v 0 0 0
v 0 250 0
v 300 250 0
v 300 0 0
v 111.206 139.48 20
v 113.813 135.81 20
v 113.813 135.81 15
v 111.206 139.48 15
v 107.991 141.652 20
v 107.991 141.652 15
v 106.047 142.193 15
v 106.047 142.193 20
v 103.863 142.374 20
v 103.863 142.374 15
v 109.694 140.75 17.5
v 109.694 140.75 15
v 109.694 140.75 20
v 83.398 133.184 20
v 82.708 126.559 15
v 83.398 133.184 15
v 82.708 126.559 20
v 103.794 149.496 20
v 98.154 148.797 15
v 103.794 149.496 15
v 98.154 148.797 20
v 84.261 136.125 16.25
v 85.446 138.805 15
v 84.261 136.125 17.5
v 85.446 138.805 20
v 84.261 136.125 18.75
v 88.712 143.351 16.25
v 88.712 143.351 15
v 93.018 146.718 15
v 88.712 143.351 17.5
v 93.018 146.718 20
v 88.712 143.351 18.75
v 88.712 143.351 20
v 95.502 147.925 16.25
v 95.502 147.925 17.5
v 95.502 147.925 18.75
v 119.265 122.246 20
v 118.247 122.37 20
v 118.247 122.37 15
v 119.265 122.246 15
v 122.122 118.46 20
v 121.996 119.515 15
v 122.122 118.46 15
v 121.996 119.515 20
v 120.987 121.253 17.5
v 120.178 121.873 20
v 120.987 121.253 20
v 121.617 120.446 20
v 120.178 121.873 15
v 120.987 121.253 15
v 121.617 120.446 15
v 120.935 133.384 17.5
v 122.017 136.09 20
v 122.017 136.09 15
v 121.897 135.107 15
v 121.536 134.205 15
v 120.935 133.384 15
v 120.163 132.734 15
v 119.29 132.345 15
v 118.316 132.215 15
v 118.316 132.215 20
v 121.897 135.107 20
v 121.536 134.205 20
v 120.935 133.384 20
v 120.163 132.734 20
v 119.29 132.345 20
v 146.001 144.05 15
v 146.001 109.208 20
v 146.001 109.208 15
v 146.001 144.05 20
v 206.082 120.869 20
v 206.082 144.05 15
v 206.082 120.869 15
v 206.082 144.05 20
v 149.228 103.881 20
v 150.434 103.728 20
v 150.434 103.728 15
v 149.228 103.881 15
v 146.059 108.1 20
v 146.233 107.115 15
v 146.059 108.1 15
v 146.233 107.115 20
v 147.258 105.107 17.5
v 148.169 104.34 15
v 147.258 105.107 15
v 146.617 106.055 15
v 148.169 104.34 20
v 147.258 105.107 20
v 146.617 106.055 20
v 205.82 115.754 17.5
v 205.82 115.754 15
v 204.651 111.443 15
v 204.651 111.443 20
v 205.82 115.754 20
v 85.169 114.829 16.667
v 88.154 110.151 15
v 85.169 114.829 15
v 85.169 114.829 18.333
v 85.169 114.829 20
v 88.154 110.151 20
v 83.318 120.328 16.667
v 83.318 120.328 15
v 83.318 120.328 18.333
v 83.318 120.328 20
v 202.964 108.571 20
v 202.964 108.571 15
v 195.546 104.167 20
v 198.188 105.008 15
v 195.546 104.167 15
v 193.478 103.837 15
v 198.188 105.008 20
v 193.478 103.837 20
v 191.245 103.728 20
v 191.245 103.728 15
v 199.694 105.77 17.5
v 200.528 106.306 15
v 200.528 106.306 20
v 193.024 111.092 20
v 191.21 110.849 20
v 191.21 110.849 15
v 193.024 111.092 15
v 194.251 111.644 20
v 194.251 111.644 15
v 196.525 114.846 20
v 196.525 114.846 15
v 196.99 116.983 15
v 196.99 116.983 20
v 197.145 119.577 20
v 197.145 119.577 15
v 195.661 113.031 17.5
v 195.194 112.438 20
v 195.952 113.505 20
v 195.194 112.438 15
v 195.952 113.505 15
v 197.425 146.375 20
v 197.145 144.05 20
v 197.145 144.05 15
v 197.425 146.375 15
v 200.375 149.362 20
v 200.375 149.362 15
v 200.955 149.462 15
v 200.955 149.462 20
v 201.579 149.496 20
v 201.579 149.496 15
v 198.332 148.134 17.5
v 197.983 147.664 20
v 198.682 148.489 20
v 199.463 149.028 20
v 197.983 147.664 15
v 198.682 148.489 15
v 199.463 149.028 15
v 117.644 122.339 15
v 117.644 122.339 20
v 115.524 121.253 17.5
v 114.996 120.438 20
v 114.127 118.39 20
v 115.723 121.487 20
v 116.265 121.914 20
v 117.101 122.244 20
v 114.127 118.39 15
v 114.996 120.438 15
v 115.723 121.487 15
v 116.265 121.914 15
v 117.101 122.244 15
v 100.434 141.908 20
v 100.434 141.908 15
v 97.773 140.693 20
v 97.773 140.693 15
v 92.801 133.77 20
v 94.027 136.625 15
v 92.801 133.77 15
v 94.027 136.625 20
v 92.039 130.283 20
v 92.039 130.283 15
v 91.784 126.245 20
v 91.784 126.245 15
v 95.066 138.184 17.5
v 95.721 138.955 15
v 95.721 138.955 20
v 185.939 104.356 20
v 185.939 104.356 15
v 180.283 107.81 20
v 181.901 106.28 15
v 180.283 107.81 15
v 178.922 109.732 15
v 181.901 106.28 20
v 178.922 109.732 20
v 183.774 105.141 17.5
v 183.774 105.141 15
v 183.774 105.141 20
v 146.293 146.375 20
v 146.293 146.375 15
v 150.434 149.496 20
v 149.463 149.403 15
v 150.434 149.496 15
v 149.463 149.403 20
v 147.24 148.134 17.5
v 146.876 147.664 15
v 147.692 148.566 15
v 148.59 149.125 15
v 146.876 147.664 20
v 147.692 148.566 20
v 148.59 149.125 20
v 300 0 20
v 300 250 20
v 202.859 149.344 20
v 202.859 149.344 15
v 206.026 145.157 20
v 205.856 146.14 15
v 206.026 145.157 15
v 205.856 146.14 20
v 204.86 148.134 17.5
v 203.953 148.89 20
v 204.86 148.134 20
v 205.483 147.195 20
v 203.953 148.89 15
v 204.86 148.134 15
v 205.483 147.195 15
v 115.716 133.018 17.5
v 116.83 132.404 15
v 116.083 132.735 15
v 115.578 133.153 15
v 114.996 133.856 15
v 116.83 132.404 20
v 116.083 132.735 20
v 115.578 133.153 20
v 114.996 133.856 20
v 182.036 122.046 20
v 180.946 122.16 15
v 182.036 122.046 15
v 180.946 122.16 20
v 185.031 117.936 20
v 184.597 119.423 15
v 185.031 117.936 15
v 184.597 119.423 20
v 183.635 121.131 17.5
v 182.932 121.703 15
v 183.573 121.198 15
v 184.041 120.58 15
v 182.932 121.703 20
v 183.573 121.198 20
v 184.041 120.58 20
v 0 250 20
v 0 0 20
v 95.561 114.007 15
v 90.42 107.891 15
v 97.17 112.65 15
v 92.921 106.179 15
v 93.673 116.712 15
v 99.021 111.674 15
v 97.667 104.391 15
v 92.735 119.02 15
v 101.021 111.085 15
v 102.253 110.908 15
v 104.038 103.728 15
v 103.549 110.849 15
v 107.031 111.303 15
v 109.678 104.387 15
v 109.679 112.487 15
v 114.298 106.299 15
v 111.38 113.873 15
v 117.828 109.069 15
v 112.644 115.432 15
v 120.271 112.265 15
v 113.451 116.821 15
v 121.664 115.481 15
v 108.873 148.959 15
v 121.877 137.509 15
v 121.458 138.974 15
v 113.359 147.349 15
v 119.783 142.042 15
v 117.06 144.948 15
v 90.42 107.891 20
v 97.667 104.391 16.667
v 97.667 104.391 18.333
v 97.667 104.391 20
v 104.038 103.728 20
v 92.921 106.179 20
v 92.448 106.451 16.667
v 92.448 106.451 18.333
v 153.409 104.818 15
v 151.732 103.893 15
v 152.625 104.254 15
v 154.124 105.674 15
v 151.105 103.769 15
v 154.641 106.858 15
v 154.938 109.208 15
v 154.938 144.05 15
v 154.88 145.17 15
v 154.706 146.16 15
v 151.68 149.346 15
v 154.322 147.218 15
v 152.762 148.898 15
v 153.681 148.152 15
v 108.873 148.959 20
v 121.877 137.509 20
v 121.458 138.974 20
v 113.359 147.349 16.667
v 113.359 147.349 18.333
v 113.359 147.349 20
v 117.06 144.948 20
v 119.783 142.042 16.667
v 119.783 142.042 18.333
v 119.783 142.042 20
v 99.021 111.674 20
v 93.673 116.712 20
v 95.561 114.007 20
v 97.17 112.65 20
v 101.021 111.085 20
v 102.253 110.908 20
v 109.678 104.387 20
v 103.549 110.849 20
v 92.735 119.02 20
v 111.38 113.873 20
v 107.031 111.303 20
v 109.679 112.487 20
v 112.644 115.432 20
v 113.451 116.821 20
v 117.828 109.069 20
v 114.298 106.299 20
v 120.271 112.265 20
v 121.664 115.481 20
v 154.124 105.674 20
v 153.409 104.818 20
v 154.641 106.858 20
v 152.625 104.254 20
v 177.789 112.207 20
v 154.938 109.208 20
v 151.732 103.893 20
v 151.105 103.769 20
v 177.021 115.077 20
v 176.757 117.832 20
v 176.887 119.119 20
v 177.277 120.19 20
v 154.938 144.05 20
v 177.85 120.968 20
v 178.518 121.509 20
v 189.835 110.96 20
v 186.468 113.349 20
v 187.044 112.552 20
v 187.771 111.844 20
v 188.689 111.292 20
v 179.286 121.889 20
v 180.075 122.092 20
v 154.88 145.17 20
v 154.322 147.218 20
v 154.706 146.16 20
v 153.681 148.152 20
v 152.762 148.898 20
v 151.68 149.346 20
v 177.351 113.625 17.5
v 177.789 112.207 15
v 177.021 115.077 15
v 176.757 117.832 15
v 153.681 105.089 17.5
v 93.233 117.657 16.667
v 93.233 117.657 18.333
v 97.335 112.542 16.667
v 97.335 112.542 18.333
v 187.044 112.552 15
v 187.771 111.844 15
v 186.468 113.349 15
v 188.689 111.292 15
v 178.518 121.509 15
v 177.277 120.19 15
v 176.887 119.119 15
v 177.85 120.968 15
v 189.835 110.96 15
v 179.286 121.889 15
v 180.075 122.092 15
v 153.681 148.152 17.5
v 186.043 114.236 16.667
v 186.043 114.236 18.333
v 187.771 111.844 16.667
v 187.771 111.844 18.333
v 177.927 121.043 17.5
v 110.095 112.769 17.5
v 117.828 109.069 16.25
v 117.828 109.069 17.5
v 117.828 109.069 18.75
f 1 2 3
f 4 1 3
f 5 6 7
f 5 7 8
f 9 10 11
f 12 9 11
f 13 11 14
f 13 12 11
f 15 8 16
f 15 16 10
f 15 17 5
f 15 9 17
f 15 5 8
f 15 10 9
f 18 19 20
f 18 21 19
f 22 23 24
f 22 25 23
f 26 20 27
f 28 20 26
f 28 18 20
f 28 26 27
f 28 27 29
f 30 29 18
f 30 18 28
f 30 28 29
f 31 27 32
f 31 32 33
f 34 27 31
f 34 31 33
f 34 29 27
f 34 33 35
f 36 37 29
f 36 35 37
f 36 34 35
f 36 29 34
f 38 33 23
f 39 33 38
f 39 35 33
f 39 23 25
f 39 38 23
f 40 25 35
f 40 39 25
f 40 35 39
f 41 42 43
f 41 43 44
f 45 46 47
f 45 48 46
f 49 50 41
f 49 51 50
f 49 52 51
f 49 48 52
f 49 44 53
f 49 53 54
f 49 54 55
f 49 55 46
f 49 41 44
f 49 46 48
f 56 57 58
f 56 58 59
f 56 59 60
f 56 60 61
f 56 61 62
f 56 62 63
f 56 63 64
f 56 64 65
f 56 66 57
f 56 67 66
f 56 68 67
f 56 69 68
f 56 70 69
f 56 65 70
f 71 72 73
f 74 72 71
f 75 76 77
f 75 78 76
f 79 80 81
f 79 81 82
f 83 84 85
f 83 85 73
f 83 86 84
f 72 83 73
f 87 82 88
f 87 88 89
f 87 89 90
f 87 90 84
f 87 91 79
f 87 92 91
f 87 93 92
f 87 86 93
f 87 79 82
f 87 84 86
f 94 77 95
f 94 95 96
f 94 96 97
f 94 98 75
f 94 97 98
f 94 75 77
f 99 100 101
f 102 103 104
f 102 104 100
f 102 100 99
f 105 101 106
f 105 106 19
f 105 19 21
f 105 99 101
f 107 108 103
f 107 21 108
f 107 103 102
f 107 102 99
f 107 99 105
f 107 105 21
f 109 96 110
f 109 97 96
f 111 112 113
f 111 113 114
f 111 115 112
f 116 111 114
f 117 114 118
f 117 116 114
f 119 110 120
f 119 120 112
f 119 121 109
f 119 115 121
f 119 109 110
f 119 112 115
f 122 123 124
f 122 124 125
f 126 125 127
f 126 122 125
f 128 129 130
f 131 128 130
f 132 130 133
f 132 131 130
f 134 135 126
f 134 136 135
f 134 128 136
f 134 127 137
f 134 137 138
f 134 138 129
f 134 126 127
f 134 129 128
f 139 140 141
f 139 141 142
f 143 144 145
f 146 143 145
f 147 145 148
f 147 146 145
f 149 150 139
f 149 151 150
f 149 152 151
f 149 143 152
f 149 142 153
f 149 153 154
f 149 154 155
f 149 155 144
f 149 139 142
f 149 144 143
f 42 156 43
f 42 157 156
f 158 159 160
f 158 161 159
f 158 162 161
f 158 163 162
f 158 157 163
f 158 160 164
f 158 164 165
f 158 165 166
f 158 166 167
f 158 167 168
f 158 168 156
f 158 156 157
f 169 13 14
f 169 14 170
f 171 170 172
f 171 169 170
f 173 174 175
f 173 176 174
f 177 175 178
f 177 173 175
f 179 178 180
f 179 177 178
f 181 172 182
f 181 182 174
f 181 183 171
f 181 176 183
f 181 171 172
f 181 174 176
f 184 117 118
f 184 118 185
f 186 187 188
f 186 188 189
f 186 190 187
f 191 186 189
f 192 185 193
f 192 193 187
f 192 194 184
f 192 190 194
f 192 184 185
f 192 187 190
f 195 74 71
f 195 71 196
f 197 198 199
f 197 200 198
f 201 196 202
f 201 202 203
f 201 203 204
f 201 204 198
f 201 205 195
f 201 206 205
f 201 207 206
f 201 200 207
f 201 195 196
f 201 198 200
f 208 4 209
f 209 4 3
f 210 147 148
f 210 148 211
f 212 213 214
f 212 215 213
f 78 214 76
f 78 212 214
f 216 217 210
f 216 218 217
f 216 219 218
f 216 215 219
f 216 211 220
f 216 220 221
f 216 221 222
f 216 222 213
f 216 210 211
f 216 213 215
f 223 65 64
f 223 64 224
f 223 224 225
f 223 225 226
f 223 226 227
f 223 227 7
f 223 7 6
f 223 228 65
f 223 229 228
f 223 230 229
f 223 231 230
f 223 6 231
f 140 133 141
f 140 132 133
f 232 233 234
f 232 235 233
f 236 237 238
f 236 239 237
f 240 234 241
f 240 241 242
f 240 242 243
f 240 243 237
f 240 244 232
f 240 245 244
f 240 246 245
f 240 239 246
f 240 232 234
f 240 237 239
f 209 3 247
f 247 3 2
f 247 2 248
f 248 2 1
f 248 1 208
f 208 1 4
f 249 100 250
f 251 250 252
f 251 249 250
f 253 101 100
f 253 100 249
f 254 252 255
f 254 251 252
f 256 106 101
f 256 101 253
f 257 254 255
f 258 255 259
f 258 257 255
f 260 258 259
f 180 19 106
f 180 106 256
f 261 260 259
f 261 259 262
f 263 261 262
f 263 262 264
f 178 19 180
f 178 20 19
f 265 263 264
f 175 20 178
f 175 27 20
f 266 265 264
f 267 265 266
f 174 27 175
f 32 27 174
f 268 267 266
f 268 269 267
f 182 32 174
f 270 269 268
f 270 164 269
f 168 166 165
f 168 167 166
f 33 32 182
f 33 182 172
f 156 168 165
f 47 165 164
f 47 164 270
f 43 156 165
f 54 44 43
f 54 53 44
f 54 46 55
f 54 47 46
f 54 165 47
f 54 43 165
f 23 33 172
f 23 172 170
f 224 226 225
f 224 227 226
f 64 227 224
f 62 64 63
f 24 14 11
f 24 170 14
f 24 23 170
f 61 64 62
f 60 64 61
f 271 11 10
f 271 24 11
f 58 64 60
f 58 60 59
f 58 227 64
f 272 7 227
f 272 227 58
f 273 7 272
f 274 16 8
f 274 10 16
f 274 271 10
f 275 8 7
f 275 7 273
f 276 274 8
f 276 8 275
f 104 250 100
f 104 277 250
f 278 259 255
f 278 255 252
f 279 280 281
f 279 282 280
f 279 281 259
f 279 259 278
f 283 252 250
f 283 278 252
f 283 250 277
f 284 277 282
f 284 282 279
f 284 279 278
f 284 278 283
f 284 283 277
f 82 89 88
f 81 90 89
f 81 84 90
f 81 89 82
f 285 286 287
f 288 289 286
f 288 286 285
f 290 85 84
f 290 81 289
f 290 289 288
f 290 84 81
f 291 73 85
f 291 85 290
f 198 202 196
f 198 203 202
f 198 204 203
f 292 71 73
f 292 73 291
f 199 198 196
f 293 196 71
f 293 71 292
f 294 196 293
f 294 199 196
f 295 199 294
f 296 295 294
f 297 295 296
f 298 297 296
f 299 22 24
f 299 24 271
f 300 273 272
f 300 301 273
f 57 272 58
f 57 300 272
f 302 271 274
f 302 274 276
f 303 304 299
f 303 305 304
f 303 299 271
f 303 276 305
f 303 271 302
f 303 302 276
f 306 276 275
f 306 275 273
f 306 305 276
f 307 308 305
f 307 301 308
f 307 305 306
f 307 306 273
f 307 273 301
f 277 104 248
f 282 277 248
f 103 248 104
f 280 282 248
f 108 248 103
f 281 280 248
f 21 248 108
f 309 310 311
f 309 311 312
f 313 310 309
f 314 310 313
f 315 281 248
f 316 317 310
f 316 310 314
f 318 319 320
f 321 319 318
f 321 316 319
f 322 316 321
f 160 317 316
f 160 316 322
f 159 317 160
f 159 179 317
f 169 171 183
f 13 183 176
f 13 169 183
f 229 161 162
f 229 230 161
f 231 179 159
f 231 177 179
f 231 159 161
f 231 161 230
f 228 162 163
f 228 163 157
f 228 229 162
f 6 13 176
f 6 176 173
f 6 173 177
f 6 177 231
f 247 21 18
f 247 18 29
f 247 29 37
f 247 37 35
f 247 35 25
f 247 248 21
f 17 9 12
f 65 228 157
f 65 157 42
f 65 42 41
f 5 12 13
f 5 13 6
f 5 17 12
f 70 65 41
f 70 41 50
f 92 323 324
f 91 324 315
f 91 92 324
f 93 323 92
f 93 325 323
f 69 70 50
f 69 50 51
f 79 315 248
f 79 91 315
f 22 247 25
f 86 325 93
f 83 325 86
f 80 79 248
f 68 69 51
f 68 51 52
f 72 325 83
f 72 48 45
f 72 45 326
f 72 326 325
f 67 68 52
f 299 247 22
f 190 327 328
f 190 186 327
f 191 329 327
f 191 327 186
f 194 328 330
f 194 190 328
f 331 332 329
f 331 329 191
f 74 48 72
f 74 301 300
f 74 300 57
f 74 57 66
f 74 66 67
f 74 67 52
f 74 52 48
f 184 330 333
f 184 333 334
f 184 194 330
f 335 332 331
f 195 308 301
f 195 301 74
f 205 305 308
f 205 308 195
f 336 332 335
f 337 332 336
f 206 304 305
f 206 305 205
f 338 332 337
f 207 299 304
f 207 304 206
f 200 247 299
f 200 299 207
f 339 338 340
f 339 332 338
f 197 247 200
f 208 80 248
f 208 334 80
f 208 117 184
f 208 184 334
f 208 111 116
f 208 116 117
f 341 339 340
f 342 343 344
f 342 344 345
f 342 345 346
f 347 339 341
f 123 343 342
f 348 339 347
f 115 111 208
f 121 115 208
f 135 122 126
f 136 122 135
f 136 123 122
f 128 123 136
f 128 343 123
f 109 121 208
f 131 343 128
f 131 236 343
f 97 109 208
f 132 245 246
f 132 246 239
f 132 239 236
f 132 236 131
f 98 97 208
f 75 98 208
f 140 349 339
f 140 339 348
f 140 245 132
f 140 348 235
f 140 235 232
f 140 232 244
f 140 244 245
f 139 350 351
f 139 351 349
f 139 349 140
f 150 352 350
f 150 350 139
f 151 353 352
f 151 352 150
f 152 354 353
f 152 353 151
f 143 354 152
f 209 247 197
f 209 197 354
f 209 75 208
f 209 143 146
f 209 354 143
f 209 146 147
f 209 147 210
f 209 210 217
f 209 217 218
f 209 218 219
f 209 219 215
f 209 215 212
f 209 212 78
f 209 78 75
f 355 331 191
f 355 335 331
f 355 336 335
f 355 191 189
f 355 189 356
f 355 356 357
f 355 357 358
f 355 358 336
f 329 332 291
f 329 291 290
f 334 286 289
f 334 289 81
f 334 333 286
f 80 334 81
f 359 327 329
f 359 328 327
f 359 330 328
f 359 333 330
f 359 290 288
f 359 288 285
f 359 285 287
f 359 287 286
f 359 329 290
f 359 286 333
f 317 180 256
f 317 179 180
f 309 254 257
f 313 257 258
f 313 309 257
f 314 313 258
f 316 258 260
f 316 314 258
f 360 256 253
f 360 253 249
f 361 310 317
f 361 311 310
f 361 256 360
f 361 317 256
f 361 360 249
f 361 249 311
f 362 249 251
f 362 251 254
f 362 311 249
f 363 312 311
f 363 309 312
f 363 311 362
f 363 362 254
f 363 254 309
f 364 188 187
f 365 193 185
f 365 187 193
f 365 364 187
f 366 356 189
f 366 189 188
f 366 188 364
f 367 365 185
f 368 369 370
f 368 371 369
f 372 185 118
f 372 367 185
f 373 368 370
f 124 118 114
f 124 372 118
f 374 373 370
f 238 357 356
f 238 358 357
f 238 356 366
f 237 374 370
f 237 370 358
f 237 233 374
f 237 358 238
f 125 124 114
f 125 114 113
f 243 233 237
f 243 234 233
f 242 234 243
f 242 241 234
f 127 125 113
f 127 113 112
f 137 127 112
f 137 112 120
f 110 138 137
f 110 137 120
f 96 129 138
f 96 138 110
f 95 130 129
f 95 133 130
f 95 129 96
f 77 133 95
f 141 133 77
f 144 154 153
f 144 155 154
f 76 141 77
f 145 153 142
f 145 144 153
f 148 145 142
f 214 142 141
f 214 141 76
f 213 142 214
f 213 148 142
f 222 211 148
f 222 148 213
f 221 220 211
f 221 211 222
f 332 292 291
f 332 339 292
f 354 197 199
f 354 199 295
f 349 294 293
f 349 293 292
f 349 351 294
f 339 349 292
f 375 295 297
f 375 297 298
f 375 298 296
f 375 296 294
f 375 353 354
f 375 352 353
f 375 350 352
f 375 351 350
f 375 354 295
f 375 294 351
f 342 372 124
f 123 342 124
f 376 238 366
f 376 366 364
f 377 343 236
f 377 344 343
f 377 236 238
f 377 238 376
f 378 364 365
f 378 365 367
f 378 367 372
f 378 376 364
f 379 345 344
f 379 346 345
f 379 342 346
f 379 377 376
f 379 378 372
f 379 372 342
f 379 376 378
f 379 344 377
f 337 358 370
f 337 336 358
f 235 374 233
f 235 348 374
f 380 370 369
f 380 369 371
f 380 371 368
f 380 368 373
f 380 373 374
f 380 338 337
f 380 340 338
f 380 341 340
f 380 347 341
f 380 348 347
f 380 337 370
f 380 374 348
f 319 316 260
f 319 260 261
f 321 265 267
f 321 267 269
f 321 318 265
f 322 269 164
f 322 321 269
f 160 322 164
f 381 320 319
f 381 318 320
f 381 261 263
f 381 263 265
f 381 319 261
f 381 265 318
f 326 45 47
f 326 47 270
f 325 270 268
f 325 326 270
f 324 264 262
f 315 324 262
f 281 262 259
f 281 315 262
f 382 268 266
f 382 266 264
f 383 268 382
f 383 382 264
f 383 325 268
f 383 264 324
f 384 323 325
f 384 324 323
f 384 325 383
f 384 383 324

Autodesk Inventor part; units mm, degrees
ref_plane "YZ Plane" through (0, 0, 0) normal (1, 0, 0) x (0, 1, 0)
ref_plane "XZ Plane" through (0, 0, 0) normal (0, 1, 0) x (-1, 0, 0)
ref_plane "XY Plane" through (0, 0, 0) normal (0, 0, 1) x (1, 0, 0)
sketch "Boceto1" plane through (0, 0, 0) normal (0, 0, 1) x (1, 0, 0)
  line L0 (0, 0) -> (300, 0)
  line L1 (300, 0) -> (300, 250)
  line L2 (300, 250) -> (0, 250)
  line L3 (0, 250) -> (0, 0)
  dimension "d0" = 300
  dimension "d1" = 250
extrude "Extrusión1" add sketch "Boceto1" along normal blind 20
sketch "Boceto2" plane through (0, 0, 20) normal (0, 0, 1) x (1, 0, 0)
  line L0 (79.6353, 149.4956) -> (210.9697, 149.4956) construction
  line L1 (210.9697, 149.4956) -> (210.9697, 103.7275) construction
  line L2 (210.9697, 103.7275) -> (79.6353, 103.7275) construction
  line L3 (79.6353, 103.7275) -> (79.6353, 149.4956) construction
  spline S0 degree 2 poles (122.1217, 118.4599) (122.1217, 116.3303) (120.062, 111.4428) (115.5934, 106.695) (108.6462, 103.7275) (104.0379, 103.7275) knots 0 0 0 1 2 3 4 4 4
  spline S1 degree 2 poles (104.0379, 103.7275) (100.5469, 103.7275) (94.7866, 105.0541) (90.1085, 107.847) (88.1535, 110.1511) knots 0 0 0 1 2 3 3 3
  spline S2 degree 2 poles (88.1535, 110.1511) (86.408, 112.2458) (83.9293, 117.4126) (82.7075, 123.2427) (82.7075, 126.5592) knots 0 0 0 1 2 3 3 3
  spline S3 degree 2 poles (82.7075, 126.5592) (82.7075, 131.9005) (85.8145, 140.349) (91.6097, 146.3536) (99.3948, 149.4956) (103.7936, 149.4956) knots 0 0 0 1 2 3 4 4 4
  spline S4 degree 2 poles (103.7936, 149.4956) (109.1698, 149.4956) (117.5484, 145.2015) (122.017, 138.8827) (122.017, 136.0898) knots 0 0 0 1 2 3 3 3
  spline S5 degree 2 poles (122.017, 136.0898) (122.017, 134.5538) (119.8525, 132.2147) (118.3165, 132.2147) knots 0 0 0 1 2 2 2
  spline S6 degree 2 poles (118.3165, 132.2147) (116.5709, 132.2147) (114.8603, 133.8206) (113.813, 135.8105) knots 0 0 0 1 2 2 2
  spline S7 degree 2 poles (113.813, 135.8105) (112.0674, 139.1271) (107.3196, 142.3738) (103.8634, 142.3738) knots 0 0 0 1 2 2 2
  spline S8 degree 2 poles (103.8634, 142.3738) (98.3475, 142.3738) (91.7843, 133.9952) (91.7843, 126.245) knots 0 0 0 1 2 2 2
  spline S9 degree 2 poles (91.7843, 126.245) (91.7843, 121.0782) (94.6819, 114.2357) (99.9883, 110.8493) (103.5492, 110.8493) knots 0 0 0 1 2 3 3 3
  spline S10 degree 2 poles (103.5492, 110.8493) (107.4243, 110.8493) (112.7656, 114.6895) (114.1272, 118.3901) knots 0 0 0 1 2 2 2
  spline S11 degree 2 poles (114.1272, 118.3901) (114.6857, 120.1356) (116.3615, 122.3699) (118.2466, 122.3699) knots 0 0 0 1 2 2 2
  spline S12 degree 2 poles (118.2466, 122.3699) (119.8525, 122.3699) (122.1217, 120.1356) (122.1217, 118.4599) knots 0 0 0 1 2 2 2
  line L4 (146.0007, 109.2085) -> (146.0007, 144.0495)
  spline S13 degree 2 poles (146.0007, 144.0495) (146.0007, 146.7725) (148.4794, 149.4956) (150.4344, 149.4956) knots 0 0 0 1 2 2 2
  spline S14 degree 2 poles (150.4344, 149.4956) (152.4243, 149.4956) (154.9379, 146.8074) (154.9379, 144.0495) knots 0 0 0 1 2 2 2
  line L5 (154.9379, 144.0495) -> (154.9379, 109.2085)
  spline S15 degree 2 poles (154.9379, 109.2085) (154.9379, 106.4506) (152.4243, 103.7275) (150.4344, 103.7275) knots 0 0 0 1 2 2 2
  spline S16 degree 2 poles (150.4344, 103.7275) (148.5143, 103.7275) (146.0007, 106.4855) (146.0007, 109.2085) knots 0 0 0 1 2 2 2
  line L6 (206.0822, 144.0495) -> (206.0822, 120.8687)
  spline S17 degree 2 poles (206.0822, 120.8687) (206.0822, 117.8664) (205.5585, 113.6422) (204.6508, 111.4428) knots 0 0 0 1 2 2 2
  spline S18 degree 2 poles (204.6508, 111.4428) (203.1497, 107.8121) (196.2373, 103.7275) (191.2451, 103.7275) knots 0 0 0 1 2 2 2
  spline S19 degree 2 poles (191.2451, 103.7275) (186.7765, 103.7275) (180.7718, 106.5553) (178.9216, 109.7322) knots 0 0 0 1 2 2 2
  spline S20 degree 2 poles (178.9216, 109.7322) (177.9441, 111.4079) (176.7571, 115.8416) (176.7571, 117.8315) knots 0 0 0 1 2 2 2
  spline S21 degree 2 poles (176.7571, 117.8315) (176.7571, 119.9261) (179.0961, 122.1604) (180.9464, 122.1604) knots 0 0 0 1 2 2 2
  spline S22 degree 2 poles (180.9464, 122.1604) (182.7269, 122.1604) (184.5422, 120.1007) (185.031, 117.9362) knots 0 0 0 1 2 2 2
  spline S23 degree 2 poles (185.031, 117.9362) (185.5197, 115.6321) (186.567, 112.8393) (188.9759, 110.8493) (191.2102, 110.8493) knots 0 0 0 1 2 3 3 3
  spline S24 degree 2 poles (191.2102, 110.8493) (197.145, 110.8493) (197.145, 119.577) knots 0 0 0 1 1 1
  line L7 (197.145, 119.577) -> (197.145, 144.0495)
  spline S25 degree 2 poles (197.145, 144.0495) (197.145, 146.7725) (199.5189, 149.4956) (201.5787, 149.4956) knots 0 0 0 1 2 2 2
  spline S26 degree 2 poles (201.5787, 149.4956) (203.6384, 149.4956) (206.0822, 146.7725) (206.0822, 144.0495) knots 0 0 0 1 2 2 2
  point P0 (0, 0)
extrude "Extrusión2" cut sketch "Boceto2" against normal blind 5
properties part number "CIJ"
